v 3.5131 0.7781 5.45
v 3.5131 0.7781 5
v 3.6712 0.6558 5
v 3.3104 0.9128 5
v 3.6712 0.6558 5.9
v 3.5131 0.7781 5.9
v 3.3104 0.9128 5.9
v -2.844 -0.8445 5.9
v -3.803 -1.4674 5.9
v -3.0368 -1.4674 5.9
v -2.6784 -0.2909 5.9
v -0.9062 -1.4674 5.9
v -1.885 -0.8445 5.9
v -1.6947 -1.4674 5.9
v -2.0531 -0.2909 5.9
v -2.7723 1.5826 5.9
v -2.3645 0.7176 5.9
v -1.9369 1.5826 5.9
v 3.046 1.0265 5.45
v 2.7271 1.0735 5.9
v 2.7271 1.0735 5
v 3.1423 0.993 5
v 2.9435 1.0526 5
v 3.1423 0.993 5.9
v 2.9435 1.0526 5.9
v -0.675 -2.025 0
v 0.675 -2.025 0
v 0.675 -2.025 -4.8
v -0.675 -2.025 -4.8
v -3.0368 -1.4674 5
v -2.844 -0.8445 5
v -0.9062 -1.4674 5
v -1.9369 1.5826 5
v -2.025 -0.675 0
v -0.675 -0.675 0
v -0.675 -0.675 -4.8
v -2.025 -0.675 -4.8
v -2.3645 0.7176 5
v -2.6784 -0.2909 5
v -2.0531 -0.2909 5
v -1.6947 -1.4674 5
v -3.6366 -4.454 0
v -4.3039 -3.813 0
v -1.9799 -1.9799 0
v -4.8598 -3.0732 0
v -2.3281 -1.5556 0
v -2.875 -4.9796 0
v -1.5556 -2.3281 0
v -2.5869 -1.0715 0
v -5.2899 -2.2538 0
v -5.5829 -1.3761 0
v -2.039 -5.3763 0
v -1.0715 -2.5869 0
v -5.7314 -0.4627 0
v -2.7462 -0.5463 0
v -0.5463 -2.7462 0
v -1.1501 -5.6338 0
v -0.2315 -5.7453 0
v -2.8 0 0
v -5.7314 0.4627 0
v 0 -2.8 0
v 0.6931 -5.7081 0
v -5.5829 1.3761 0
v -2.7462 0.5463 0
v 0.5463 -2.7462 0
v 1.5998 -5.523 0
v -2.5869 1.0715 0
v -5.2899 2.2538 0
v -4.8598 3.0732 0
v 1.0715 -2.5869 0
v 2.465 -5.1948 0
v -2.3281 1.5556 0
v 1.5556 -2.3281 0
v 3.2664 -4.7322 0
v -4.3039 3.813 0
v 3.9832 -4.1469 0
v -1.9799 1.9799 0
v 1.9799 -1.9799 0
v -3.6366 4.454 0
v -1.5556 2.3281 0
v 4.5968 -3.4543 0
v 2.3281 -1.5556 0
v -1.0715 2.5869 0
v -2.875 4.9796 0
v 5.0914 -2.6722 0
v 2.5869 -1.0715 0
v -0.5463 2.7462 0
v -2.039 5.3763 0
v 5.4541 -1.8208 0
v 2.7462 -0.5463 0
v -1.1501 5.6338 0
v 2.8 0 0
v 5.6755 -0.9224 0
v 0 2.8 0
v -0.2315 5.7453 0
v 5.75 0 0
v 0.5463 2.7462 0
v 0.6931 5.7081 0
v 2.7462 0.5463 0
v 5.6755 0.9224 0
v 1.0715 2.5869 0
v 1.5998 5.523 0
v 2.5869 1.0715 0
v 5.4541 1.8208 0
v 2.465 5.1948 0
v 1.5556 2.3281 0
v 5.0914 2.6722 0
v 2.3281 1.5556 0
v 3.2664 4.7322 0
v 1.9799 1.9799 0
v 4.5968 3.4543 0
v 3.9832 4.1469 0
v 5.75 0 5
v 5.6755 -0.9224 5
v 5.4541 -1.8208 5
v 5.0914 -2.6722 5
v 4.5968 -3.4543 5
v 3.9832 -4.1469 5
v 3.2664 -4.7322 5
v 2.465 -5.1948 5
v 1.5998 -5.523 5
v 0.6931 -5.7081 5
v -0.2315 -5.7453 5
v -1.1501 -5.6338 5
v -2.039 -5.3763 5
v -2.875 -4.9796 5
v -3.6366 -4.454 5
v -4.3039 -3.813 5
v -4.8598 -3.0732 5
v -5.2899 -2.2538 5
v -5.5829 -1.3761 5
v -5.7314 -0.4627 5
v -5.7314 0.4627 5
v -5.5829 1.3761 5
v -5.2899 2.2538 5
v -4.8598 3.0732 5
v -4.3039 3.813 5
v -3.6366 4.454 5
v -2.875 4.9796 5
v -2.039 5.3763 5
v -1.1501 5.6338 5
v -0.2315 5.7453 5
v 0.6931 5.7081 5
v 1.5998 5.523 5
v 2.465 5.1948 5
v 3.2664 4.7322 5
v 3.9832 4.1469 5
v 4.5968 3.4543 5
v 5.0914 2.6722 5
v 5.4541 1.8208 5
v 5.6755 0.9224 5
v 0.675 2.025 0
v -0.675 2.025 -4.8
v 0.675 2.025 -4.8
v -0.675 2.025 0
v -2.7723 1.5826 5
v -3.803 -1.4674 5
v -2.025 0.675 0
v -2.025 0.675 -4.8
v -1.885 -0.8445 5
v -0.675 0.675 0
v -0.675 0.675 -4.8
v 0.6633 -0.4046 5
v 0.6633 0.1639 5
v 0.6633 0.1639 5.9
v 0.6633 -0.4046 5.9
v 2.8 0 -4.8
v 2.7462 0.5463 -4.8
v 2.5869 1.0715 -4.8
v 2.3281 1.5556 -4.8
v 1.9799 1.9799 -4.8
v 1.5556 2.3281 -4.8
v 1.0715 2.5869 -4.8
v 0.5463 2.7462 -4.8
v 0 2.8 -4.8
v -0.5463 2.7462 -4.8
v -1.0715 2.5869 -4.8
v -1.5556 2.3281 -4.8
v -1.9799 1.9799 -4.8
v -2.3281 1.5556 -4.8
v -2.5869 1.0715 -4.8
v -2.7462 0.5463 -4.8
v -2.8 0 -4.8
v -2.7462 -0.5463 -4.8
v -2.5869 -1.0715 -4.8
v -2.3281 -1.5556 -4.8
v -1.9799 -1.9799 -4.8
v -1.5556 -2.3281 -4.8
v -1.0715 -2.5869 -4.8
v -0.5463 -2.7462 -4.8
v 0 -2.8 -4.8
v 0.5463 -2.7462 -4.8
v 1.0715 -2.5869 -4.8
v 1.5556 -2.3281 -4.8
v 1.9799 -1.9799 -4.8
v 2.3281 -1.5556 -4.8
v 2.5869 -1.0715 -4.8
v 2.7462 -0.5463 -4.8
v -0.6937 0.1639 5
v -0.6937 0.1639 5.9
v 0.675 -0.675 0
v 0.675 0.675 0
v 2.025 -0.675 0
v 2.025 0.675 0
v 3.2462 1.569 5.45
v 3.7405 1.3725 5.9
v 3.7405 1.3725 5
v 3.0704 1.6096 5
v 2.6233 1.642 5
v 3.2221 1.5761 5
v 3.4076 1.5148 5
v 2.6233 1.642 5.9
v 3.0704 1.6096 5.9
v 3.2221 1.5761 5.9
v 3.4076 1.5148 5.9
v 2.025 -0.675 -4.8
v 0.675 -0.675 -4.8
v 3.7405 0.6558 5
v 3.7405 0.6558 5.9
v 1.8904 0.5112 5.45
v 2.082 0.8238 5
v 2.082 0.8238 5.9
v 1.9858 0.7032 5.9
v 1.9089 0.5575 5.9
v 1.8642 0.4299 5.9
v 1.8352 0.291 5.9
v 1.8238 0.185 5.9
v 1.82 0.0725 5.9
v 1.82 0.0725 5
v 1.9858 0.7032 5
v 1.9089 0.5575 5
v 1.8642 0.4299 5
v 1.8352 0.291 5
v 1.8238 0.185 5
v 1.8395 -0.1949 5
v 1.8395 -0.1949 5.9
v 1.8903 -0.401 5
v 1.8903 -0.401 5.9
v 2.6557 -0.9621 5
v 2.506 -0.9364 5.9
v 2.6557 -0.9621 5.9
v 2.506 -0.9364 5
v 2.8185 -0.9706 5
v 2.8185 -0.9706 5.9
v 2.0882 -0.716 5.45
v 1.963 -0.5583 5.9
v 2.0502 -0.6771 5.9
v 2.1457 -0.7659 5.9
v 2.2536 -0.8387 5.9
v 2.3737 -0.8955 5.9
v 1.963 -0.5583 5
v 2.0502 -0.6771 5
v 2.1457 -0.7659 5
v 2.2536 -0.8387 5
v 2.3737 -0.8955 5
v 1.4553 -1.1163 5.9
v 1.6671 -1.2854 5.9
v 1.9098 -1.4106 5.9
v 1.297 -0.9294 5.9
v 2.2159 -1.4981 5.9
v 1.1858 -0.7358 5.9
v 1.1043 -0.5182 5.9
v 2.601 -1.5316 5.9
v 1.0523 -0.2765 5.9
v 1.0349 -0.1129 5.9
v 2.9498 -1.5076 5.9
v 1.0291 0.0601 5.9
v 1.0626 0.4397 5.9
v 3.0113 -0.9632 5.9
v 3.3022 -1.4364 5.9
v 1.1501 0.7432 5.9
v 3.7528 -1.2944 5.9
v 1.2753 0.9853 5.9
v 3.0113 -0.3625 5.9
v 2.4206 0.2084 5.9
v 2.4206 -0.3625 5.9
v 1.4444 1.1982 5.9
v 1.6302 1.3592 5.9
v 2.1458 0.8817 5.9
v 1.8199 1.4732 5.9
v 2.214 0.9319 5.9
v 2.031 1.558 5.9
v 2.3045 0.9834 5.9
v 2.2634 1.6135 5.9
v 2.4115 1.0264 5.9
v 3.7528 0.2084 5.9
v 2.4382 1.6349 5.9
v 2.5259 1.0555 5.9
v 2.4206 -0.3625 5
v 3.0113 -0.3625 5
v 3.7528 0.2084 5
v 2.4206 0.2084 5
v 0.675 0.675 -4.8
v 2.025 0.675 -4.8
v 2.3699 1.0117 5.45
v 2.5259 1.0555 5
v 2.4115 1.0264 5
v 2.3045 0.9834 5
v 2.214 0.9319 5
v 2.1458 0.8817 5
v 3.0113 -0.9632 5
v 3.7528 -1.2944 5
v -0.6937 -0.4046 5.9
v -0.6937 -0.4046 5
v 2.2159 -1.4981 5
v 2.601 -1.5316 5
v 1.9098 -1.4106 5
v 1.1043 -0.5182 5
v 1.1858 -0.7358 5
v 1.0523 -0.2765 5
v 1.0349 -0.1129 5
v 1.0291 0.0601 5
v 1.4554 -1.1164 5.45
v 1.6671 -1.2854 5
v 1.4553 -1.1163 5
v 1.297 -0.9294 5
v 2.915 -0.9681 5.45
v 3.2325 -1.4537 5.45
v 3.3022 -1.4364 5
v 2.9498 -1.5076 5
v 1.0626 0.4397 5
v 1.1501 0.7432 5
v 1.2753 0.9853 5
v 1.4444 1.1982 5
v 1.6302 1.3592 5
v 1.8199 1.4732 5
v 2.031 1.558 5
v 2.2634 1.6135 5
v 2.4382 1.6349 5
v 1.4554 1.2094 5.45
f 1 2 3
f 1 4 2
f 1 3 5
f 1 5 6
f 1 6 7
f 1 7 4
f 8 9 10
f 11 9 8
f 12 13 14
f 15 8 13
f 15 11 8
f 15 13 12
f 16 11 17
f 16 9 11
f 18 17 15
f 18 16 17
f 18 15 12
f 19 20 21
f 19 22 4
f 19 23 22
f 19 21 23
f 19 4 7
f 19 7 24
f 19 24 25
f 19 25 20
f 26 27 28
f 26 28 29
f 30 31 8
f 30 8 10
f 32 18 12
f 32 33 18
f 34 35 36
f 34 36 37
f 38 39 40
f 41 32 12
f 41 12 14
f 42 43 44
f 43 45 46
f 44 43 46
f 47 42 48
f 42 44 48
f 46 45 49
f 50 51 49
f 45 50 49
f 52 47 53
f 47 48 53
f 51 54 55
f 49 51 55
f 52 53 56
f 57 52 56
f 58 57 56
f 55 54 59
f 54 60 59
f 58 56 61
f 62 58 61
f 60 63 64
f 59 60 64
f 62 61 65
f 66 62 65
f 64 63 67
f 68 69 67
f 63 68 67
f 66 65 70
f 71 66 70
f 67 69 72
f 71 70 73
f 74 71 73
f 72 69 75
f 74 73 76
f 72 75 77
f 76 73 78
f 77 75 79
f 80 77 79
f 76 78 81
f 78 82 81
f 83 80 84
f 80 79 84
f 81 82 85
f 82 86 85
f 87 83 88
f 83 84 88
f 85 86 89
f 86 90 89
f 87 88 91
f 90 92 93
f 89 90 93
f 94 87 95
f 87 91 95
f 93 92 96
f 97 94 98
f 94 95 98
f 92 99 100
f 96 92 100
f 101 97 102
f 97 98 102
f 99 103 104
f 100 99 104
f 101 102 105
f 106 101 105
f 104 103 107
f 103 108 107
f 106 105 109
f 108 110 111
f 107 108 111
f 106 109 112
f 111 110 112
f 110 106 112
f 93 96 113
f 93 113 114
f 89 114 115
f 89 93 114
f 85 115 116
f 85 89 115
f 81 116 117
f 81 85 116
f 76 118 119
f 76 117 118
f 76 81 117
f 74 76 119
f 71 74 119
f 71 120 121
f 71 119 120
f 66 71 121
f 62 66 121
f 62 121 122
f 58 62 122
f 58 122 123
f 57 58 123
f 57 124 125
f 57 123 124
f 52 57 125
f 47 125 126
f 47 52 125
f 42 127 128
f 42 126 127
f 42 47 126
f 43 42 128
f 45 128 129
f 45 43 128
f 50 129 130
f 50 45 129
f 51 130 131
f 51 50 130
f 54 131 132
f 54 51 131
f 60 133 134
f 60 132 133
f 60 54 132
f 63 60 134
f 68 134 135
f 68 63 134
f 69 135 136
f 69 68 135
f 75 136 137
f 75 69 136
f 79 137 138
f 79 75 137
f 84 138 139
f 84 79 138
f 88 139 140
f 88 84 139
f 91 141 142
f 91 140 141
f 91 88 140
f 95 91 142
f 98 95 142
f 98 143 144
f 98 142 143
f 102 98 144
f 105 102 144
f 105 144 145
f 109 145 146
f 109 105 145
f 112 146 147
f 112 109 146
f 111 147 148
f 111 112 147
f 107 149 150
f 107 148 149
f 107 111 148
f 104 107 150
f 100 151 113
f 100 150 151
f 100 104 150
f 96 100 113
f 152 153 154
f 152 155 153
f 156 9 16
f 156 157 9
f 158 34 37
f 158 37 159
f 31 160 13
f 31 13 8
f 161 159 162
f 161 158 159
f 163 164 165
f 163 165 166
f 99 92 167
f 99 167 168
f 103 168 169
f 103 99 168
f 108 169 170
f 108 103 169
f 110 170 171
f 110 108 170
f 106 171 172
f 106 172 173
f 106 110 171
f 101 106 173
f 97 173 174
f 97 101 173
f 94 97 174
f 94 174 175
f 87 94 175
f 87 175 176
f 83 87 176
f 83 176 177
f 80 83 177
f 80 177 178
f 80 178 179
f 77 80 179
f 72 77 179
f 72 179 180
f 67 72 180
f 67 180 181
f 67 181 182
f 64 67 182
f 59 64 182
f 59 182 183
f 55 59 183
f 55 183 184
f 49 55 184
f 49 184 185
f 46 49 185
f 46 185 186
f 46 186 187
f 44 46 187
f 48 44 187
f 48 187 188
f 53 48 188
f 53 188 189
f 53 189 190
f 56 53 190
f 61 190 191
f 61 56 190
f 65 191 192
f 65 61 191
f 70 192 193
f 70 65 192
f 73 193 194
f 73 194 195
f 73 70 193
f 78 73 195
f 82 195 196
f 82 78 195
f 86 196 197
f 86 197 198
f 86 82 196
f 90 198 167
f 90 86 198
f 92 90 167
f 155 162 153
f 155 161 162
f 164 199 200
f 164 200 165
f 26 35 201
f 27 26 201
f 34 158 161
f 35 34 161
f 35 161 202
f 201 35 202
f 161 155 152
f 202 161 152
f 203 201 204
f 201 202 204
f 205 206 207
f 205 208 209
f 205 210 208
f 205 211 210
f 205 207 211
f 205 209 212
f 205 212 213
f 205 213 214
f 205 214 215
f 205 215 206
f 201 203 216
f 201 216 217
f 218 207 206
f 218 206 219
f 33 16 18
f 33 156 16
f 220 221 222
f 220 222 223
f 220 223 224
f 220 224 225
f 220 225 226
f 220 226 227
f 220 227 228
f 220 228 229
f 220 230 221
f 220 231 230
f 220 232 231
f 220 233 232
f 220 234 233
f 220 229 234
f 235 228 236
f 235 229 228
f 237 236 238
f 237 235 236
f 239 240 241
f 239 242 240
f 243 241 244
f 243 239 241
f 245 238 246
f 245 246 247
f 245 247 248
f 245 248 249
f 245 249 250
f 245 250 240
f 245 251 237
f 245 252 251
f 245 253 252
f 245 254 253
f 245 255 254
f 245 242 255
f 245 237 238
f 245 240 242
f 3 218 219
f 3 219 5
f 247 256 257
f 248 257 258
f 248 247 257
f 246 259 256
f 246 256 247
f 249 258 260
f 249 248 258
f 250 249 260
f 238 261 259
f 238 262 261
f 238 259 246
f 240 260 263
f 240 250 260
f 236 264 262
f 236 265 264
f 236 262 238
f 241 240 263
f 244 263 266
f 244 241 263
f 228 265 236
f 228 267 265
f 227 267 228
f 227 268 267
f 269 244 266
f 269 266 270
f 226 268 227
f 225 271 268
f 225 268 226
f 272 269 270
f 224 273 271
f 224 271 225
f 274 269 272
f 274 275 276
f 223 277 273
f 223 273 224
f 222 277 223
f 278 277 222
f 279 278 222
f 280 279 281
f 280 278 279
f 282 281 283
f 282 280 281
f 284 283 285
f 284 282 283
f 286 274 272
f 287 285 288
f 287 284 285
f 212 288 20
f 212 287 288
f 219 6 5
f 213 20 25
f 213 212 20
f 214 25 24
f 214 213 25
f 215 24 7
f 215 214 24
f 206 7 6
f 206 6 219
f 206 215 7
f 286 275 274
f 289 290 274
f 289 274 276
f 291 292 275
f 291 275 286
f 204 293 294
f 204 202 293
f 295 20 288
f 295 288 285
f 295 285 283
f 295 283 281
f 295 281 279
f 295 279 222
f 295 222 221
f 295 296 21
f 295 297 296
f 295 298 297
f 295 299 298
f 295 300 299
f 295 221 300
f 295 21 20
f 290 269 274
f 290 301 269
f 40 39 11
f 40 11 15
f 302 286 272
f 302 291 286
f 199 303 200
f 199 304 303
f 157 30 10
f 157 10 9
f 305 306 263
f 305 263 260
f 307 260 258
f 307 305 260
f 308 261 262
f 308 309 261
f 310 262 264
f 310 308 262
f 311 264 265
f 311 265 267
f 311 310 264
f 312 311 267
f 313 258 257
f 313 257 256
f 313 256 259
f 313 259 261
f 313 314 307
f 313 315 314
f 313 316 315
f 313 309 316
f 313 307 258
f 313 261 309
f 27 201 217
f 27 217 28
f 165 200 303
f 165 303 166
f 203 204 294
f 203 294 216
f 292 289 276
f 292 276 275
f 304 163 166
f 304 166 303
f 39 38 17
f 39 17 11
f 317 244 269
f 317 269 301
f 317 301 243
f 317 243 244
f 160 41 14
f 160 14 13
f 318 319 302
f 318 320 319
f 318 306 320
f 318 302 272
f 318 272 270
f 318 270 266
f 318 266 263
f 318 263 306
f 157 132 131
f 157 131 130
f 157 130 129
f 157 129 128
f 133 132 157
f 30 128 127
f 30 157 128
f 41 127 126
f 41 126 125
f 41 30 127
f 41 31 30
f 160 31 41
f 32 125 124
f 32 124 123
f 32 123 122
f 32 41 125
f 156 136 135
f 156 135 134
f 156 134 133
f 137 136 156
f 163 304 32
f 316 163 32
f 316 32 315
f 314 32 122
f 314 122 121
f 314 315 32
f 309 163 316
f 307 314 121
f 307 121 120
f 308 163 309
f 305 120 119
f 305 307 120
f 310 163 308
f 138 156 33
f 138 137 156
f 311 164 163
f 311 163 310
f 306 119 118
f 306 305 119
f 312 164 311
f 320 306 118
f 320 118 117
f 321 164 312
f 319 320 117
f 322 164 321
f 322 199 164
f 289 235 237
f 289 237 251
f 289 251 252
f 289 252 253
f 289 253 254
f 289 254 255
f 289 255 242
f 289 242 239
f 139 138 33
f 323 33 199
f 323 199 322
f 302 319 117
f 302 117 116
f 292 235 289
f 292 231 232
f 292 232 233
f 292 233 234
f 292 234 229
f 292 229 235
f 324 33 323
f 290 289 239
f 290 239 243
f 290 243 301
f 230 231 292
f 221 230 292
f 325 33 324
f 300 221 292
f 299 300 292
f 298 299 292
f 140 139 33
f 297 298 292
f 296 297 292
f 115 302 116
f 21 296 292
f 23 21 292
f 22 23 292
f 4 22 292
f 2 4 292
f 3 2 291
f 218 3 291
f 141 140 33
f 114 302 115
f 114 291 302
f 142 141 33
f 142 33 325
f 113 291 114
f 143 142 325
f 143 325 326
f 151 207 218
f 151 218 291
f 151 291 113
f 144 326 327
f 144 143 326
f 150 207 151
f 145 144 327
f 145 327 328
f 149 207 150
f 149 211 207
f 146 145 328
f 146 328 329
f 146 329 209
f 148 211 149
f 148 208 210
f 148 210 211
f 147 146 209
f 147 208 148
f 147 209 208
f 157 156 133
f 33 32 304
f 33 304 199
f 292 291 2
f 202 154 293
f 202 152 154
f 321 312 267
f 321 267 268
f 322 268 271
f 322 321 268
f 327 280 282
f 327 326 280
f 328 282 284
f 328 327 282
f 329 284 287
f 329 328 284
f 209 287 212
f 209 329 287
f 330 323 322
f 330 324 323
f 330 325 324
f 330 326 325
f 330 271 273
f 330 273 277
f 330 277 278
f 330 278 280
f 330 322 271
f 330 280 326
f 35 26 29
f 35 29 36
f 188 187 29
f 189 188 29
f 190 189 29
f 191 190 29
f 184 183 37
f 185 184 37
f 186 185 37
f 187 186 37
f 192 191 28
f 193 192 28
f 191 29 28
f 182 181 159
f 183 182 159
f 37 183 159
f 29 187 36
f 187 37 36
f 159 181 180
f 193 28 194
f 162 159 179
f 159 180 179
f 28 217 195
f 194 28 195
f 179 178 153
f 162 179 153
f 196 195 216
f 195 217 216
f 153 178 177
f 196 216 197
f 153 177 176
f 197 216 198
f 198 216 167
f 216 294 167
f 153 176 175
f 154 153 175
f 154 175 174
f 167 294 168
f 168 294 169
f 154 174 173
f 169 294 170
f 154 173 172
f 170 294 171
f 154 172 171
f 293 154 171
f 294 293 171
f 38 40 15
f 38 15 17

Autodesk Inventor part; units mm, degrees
ref_plane "YZ Plane" through (0, 0, 0) normal (1, 0, 0) x (0, 1, 0)
ref_plane "XZ Plane" through (0, 0, 0) normal (0, 1, 0) x (-1, 0, 0)
ref_plane "XY Plane" through (0, 0, 0) normal (0, 0, 1) x (1, 0, 0)
sketch "Sketch1" plane through (0, 0, 0) normal (0, 0, 1) x (1, 0, 0)
  circle A0 centre (0, 0) radius 6.22 construction
  circle A1 centre (0, 0) radius 2.8
  line L0 (-0.675, 0.675) -> (-0.675, 2.025)
  line L1 (-0.675, 2.025) -> (0.675, 2.025)
  line L2 (0.675, 2.025) -> (0.675, 0.675)
  line L3 (0.675, 0.675) -> (2.025, 0.675)
  line L4 (2.025, 0.675) -> (2.025, -0.675)
  line L5 (2.025, -0.675) -> (0.675, -0.675)
  line L6 (0.675, -0.675) -> (0.675, -2.025)
  line L7 (0.675, -2.025) -> (-0.675, -2.025)
  line L8 (-0.675, -2.025) -> (-0.675, -0.675)
  line L9 (-0.675, -0.675) -> (-2.025, -0.675)
  line L10 (-2.025, -0.675) -> (-2.025, 0.675)
  line L11 (-2.025, 0.675) -> (-0.675, 0.675)
  circle A2 centre (0, 0) radius 5.75
  point P0 (-6.07, -6.1)
  dimension "d0" = 12.44
  dimension "d1" = 0.47
extrude "Extrusion1" add sketch "Sketch1" along normal blind 5 contours A1 | L0 L1 L2 L3 L4 L5 L6 L7 L8 L9 L10 L11 | A2
extrude "Extrusion2" add sketch "Sketch1" against normal blind 4.8 contours A1
sketch "Sketch2" plane through (0, 0, 5) normal (0, 0, 1) x (1, 0, 0)
  point P0 (0, 0)
sketch "Sketch3" plane through (0, 0, 5) normal (0, 0, 1) x (1, 0, 0)
  line L0 (-3.7906, 1.642) -> (3.8677, 1.642) construction
  line L1 (3.8677, 1.642) -> (3.8677, -1.5876) construction
  line L2 (3.8677, -1.5876) -> (-3.7906, -1.5876) construction
  line L3 (-3.7906, -1.5876) -> (-3.7906, 1.642) construction
  line L4 (-3.803, -1.4674) -> (-2.7723, 1.5826)
  line L5 (-2.7723, 1.5826) -> (-1.9369, 1.5826)
  line L6 (-1.9369, 1.5826) -> (-0.9062, -1.4674)
  line L7 (-0.9062, -1.4674) -> (-1.6947, -1.4674)
  line L8 (-1.6947, -1.4674) -> (-1.885, -0.8445)
  line L9 (-1.885, -0.8445) -> (-2.844, -0.8445)
  line L10 (-2.844, -0.8445) -> (-3.0368, -1.4674)
  line L11 (-3.0368, -1.4674) -> (-3.803, -1.4674)
  line L12 (-2.0531, -0.2909) -> (-2.3645, 0.7176)
  line L13 (-2.3645, 0.7176) -> (-2.6784, -0.2909)
  line L14 (-2.6784, -0.2909) -> (-2.0531, -0.2909)
  line L15 (0.6633, -0.4046) -> (-0.6937, -0.4046)
  line L16 (-0.6937, -0.4046) -> (-0.6937, 0.1639)
  line L17 (-0.6937, 0.1639) -> (0.6633, 0.1639)
  line L18 (0.6633, 0.1639) -> (0.6633, -0.4046)
  spline S0 degree 2 poles (3.7528, -1.2944) (3.5526, -1.3759) (2.9125, -1.5316) (2.601, -1.5316) knots 0 0 0 1 2 2 2
  spline S1 degree 2 poles (2.601, -1.5316) (1.8818, -1.5316) (1.0291, -0.7012) (1.0291, 0.0601) knots 0 0 0 1 2 2 2
  spline S2 degree 2 poles (1.0291, 0.0601) (1.0291, 0.7769) (1.8818, 1.642) (2.6233, 1.642) knots 0 0 0 1 2 2 2
  spline S3 degree 2 poles (2.6233, 1.642) (3.0064, 1.642) (3.4859, 1.4961) (3.7405, 1.3725) knots 0 0 0 1 2 2 2
  line L19 (3.7405, 1.3725) -> (3.7405, 0.6558)
  line L20 (3.7405, 0.6558) -> (3.6712, 0.6558)
  spline S4 degree 2 poles (3.6712, 0.6558) (3.6169, 0.6978) (3.4093, 0.8584) (3.3104, 0.9128) knots 0 0 0 1 2 2 2
  spline S5 degree 2 poles (3.3104, 0.9128) (3.1967, 0.9796) (2.8952, 1.0735) (2.7271, 1.0735) knots 0 0 0 1 2 2 2
  spline S6 degree 2 poles (2.7271, 1.0735) (2.5318, 1.0735) (2.208, 0.9499) (2.082, 0.8238) knots 0 0 0 1 2 2 2
  spline S7 degree 2 poles (2.082, 0.8238) (1.9609, 0.7003) (1.82, 0.3221) (1.82, 0.0725) knots 0 0 0 1 2 2 2
  spline S8 degree 2 poles (1.82, 0.0725) (1.82, -0.4614) (2.3563, -0.9706) (2.8185, -0.9706) knots 0 0 0 1 2 2 2
  spline S9 degree 2 poles (2.8185, -0.9706) (2.8606, -0.9706) (2.9693, -0.9656) (3.0113, -0.9632) knots 0 0 0 1 2 2 2
  line L21 (3.0113, -0.9632) -> (3.0113, -0.3625)
  line L22 (3.0113, -0.3625) -> (2.4206, -0.3625)
  line L23 (2.4206, -0.3625) -> (2.4206, 0.2084)
  line L24 (2.4206, 0.2084) -> (3.7528, 0.2084)
  line L25 (3.7528, 0.2084) -> (3.7528, -1.2944)
  point P0 (0.0385, -1.5876)
  point P1 (3.8677, 0.0272)
  point P2 (0, 0.1089)
  point P3 (0, 0.1089)
extrude "Extrusion7" add sketch "Sketch3" along normal blind 0.9
properties part number "IPC A-G key"
